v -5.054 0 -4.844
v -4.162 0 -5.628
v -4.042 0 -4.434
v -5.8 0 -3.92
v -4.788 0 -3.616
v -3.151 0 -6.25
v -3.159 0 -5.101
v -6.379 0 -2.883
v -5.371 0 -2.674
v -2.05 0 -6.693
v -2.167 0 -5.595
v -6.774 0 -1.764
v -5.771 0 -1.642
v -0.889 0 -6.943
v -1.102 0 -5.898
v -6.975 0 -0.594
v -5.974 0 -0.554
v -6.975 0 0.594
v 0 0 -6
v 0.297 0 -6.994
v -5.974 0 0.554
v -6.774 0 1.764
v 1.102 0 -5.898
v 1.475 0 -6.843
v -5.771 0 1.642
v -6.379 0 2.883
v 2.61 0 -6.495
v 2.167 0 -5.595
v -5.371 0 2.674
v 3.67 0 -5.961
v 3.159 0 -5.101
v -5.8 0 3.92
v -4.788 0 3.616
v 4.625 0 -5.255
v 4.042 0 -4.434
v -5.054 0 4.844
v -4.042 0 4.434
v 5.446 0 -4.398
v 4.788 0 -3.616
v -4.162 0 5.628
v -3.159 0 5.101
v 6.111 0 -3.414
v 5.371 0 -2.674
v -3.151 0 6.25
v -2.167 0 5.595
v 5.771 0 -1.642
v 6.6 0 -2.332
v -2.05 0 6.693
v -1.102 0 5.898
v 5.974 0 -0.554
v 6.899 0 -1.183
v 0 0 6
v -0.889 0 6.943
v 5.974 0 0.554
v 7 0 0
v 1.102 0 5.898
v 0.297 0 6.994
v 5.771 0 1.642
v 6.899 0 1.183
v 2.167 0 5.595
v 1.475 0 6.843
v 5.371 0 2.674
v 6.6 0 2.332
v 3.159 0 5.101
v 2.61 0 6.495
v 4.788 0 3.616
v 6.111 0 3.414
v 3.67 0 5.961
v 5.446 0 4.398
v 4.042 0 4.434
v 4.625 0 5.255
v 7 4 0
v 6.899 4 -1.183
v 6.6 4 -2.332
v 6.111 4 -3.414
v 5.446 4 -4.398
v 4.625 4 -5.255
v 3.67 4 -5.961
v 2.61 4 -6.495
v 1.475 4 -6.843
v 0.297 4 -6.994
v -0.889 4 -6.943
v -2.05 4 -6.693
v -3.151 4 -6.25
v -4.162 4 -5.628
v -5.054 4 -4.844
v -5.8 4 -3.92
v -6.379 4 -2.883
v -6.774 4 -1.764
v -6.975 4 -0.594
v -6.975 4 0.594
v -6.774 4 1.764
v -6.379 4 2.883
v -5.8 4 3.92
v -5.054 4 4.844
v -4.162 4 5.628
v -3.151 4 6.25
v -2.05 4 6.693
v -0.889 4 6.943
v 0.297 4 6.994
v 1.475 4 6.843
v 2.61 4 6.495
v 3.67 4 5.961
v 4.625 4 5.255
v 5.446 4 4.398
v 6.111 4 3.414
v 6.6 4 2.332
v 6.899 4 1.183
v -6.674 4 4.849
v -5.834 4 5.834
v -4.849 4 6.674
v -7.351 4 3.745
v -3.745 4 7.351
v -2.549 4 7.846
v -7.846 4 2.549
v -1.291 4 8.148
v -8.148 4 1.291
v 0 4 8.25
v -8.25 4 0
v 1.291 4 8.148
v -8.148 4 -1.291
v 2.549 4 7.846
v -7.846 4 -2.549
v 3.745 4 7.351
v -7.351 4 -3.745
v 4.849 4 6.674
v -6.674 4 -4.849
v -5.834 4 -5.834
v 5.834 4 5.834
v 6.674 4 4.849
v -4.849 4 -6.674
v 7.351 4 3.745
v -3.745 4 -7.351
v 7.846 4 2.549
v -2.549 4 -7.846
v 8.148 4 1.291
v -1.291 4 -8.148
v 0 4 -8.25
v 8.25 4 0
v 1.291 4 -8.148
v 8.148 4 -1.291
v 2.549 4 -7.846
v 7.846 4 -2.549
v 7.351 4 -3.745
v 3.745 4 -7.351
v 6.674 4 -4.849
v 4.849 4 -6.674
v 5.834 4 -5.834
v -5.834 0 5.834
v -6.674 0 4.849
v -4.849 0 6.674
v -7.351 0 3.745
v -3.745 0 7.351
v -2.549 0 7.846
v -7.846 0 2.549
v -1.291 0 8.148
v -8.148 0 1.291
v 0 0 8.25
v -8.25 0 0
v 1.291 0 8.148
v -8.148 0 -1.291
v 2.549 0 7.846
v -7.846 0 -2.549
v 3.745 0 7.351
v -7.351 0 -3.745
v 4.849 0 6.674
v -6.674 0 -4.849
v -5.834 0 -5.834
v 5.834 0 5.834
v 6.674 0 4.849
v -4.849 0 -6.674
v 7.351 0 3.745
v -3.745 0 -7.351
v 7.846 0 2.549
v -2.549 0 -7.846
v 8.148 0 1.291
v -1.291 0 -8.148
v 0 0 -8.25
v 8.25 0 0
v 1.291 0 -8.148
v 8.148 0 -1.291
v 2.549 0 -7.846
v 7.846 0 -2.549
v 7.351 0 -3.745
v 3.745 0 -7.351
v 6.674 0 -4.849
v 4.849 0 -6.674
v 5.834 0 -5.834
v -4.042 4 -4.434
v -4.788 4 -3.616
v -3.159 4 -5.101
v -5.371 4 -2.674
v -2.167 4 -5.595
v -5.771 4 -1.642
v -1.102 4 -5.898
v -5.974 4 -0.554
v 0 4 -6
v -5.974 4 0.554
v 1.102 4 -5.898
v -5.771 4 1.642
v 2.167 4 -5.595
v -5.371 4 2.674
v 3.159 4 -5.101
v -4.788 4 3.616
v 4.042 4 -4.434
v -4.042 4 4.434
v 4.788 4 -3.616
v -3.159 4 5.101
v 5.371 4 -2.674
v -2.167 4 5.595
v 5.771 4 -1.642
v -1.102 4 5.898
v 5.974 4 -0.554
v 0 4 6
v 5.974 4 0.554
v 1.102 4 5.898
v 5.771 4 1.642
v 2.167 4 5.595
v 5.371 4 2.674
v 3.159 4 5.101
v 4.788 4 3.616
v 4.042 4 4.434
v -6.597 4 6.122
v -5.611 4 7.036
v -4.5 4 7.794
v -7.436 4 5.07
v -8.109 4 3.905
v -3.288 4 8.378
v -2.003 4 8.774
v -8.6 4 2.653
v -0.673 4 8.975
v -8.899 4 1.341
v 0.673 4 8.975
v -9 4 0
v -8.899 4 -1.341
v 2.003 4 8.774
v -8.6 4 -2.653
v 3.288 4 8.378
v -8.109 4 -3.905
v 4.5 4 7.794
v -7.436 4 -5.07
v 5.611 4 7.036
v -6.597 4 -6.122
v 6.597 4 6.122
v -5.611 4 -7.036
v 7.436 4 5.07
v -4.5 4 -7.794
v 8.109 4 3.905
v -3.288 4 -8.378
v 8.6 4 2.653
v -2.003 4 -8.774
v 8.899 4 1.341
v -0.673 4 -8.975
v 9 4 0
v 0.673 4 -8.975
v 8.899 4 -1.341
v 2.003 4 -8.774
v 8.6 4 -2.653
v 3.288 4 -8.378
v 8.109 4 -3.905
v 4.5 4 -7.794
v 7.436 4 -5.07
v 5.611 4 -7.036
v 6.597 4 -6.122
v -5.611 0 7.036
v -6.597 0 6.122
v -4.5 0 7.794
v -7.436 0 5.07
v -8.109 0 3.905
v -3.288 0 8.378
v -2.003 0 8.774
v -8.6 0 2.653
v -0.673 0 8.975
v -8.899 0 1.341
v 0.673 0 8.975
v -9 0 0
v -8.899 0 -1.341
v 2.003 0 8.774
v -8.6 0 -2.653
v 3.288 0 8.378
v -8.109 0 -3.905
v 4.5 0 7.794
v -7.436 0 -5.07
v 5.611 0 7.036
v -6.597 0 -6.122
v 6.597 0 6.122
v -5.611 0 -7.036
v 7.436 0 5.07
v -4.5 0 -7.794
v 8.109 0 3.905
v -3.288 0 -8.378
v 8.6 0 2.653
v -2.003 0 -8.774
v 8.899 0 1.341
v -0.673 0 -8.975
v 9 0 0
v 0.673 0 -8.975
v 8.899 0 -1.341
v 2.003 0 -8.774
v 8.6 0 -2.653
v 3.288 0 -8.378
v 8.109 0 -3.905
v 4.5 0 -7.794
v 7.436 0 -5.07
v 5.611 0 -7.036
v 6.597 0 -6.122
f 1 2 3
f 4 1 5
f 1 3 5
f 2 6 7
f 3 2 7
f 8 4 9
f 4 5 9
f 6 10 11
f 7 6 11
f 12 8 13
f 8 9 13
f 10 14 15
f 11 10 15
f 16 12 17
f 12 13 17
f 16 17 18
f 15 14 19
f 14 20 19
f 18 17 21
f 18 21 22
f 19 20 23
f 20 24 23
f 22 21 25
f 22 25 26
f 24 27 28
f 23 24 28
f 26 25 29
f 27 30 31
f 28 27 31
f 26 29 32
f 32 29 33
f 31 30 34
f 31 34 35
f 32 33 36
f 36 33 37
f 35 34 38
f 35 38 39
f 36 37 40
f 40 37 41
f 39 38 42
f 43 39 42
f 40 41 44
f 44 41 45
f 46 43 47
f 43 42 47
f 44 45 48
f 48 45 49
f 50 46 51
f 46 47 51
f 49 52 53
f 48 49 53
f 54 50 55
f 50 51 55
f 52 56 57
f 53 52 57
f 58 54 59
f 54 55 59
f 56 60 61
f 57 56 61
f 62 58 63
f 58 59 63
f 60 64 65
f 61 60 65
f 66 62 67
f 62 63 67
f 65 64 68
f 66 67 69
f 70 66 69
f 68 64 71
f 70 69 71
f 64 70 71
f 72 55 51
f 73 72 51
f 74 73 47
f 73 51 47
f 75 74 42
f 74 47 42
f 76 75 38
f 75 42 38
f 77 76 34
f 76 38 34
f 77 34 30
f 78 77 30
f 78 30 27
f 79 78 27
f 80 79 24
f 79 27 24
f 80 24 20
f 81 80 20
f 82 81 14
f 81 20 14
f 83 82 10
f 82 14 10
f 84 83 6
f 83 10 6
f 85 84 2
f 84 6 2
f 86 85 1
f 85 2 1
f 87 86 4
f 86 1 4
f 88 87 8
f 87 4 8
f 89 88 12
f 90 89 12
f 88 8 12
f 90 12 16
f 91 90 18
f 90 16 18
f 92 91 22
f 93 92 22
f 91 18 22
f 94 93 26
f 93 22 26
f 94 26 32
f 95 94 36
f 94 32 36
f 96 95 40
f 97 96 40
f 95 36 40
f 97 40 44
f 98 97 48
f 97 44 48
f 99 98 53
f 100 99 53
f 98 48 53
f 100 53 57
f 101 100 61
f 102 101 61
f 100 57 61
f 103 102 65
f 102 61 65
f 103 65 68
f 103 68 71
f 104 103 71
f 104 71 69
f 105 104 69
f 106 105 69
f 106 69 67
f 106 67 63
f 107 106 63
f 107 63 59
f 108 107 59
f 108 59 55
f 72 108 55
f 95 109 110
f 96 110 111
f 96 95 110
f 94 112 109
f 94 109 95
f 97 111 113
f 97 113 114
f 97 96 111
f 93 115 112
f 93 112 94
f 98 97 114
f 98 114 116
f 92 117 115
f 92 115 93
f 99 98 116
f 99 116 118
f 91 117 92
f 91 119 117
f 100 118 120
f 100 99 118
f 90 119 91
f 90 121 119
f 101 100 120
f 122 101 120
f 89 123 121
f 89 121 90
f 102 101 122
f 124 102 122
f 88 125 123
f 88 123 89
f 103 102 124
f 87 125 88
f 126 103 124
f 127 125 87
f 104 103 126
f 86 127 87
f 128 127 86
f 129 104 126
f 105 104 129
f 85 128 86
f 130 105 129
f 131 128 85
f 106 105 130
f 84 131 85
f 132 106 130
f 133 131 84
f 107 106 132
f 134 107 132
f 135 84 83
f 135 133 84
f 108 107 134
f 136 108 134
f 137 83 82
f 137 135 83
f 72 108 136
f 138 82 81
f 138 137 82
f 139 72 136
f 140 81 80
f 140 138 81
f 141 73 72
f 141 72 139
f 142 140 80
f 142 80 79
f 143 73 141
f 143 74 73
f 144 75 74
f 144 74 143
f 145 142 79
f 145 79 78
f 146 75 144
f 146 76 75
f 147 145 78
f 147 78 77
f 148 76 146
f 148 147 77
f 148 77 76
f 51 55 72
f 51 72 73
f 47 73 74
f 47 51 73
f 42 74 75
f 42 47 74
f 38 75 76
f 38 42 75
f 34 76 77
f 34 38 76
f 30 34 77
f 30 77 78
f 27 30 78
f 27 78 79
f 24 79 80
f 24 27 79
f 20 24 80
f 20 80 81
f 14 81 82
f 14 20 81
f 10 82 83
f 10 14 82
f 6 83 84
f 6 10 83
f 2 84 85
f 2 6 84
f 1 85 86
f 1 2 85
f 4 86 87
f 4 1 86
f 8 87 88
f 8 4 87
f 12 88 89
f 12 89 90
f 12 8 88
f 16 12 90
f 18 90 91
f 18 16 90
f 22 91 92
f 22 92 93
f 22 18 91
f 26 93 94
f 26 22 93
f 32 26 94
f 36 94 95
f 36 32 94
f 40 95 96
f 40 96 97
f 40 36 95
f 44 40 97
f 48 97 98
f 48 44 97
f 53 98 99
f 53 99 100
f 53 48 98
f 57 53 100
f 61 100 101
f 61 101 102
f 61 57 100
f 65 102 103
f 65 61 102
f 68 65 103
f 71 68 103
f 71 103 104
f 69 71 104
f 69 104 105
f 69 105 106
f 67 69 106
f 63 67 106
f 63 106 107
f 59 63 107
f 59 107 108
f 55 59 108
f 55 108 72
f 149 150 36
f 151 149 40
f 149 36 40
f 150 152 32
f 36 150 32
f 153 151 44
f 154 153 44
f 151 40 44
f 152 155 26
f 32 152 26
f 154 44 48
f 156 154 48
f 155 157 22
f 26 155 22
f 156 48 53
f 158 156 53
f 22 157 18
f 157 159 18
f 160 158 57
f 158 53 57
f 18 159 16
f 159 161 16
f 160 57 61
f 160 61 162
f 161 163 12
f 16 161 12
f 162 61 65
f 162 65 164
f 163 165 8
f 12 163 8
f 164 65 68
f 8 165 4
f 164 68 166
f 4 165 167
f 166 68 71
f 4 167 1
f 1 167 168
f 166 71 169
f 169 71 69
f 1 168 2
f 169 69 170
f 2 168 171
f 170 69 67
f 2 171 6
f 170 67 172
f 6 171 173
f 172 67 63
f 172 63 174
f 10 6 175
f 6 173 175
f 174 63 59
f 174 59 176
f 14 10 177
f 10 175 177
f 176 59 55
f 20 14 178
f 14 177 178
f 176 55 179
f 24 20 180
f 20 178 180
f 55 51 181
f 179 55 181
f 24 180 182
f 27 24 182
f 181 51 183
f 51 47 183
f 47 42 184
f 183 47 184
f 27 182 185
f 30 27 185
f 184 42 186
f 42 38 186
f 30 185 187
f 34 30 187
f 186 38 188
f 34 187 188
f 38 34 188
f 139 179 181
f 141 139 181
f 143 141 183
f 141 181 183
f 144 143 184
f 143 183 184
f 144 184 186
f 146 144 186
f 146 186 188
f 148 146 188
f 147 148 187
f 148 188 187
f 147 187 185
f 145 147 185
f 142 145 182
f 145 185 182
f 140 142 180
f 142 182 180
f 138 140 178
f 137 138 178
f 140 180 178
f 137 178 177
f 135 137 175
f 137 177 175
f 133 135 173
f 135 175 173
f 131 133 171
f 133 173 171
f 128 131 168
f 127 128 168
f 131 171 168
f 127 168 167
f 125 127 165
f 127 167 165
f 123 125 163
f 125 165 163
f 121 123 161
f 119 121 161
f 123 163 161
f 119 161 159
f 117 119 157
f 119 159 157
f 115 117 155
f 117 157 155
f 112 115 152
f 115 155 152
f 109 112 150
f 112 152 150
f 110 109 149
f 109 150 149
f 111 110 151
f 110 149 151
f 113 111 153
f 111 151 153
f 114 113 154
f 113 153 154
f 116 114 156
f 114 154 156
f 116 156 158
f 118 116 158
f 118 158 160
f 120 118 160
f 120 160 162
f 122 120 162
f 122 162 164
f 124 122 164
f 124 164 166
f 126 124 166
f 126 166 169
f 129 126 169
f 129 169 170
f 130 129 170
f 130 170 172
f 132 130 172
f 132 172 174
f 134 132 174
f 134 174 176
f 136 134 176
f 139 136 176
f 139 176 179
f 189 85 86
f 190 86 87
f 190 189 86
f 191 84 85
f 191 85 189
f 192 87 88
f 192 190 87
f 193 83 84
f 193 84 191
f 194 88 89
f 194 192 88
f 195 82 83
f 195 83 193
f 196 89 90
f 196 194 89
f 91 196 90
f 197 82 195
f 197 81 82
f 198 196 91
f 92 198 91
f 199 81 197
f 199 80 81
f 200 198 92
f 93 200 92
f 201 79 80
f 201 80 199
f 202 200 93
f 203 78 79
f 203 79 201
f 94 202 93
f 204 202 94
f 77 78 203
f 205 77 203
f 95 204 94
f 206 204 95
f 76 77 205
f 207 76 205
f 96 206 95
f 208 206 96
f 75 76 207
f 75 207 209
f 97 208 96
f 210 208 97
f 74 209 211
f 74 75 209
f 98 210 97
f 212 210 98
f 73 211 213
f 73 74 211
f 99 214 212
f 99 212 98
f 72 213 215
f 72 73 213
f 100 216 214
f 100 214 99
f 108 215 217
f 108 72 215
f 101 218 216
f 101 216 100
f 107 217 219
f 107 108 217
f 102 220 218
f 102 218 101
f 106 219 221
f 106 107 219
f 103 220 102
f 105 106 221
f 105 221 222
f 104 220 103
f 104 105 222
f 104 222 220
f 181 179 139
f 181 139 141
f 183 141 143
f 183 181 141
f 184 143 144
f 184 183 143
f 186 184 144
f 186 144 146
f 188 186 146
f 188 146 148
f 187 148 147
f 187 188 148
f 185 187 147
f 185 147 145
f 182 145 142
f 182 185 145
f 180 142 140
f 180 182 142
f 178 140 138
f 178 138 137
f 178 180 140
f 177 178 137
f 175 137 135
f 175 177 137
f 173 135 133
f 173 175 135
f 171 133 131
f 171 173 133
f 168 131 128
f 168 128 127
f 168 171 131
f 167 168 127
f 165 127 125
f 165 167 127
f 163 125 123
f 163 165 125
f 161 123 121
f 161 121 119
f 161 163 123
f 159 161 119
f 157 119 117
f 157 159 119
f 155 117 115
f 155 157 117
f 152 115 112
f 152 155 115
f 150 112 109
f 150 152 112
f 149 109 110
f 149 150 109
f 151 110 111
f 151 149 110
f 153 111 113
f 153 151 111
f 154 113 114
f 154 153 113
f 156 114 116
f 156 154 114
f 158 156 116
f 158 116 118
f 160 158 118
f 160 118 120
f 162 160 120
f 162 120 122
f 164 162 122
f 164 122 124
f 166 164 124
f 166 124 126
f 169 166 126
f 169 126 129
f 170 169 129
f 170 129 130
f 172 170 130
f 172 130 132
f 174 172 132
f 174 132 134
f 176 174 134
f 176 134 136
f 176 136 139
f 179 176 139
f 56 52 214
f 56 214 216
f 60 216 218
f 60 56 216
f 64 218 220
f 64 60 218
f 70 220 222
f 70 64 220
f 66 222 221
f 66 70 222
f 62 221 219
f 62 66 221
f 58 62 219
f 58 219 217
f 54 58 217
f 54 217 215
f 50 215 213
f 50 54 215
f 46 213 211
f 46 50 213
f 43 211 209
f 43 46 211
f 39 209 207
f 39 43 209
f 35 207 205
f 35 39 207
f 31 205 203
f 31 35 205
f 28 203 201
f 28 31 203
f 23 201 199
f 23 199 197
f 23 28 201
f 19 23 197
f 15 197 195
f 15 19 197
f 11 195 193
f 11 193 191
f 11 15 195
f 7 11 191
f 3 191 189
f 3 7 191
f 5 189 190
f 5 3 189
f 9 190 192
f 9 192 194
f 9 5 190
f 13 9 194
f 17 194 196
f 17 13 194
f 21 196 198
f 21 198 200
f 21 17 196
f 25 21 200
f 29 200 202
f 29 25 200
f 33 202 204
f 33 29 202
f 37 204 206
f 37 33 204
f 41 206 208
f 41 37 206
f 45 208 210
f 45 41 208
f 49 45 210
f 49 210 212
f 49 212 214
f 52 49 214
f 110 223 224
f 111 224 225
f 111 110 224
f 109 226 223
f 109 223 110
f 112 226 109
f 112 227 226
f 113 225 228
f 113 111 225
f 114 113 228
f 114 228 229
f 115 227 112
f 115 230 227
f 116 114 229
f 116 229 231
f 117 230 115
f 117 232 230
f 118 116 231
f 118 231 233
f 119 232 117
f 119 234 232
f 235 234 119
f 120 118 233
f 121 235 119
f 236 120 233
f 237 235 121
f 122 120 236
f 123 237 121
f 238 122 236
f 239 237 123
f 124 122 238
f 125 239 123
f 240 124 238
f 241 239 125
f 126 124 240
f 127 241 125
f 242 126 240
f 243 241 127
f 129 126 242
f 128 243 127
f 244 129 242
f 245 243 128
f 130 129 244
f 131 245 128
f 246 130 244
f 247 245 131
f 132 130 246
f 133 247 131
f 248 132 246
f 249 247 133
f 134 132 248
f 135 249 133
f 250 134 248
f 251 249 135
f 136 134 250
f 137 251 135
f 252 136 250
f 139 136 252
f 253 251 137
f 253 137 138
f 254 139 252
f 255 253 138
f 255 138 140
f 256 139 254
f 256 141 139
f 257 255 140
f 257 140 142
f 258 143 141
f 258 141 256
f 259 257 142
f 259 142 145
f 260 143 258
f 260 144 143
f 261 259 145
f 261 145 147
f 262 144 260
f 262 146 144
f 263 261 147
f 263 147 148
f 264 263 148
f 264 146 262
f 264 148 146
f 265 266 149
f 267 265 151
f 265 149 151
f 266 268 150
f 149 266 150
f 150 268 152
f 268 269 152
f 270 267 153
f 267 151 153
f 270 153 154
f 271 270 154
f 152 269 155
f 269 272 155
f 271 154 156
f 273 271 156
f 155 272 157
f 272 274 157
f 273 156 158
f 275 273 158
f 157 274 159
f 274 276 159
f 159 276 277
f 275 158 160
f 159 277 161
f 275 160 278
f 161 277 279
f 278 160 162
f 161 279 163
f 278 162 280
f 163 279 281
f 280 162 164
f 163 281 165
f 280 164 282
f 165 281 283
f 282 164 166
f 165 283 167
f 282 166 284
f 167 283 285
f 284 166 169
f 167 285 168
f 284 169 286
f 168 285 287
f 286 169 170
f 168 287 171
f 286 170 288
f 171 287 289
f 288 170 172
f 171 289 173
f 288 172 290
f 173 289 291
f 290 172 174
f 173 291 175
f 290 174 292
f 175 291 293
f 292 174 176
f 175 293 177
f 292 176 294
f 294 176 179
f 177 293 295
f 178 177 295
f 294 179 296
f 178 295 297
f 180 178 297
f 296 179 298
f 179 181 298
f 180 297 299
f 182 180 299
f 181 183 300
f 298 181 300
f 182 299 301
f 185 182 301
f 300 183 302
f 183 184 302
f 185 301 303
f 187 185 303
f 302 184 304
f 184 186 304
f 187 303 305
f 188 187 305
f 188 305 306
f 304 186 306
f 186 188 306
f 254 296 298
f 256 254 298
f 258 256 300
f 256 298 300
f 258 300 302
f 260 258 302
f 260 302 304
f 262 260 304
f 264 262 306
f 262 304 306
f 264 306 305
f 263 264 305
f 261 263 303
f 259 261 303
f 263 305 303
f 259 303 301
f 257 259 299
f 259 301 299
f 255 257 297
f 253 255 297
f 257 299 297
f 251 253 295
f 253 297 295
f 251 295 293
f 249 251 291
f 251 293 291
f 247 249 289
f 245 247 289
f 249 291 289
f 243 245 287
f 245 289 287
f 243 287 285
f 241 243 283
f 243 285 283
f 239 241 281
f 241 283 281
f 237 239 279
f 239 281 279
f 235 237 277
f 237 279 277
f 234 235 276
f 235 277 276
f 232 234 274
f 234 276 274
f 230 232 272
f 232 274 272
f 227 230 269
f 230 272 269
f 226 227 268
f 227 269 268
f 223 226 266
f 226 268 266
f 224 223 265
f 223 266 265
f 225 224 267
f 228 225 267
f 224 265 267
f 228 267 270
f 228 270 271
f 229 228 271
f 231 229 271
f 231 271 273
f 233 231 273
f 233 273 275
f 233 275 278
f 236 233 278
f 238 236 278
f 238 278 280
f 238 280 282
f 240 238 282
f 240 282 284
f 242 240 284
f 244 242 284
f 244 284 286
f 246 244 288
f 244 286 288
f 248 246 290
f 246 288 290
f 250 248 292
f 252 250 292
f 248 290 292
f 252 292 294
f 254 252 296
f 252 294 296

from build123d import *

# Parameters (mm, degrees)
SKETCH_1_R                   = 9
SKETCH_1_R_2                 = 6
EXTRUDE_1_DEPTH              = 4
SPLIT_BODIES_1_OUTLINE_R     = 8.25
SPLIT_BODIES_1_OUTLINE_R_2   = 7
SPLIT_BODIES_1_DEPTH         = 4
SPLIT_BODIES_1_2_OUTLINE_R   = 9
SPLIT_BODIES_1_2_OUTLINE_R_2 = 7
SPLIT_BODIES_1_2_DEPTH       = 4
SPLIT_BODIES_1_3_OUTLINE_R   = 9
SPLIT_BODIES_1_3_OUTLINE_R_2 = 8.25
SPLIT_BODIES_1_3_DEPTH       = 4


# Read off the part's stored shape, not the designer's step: 分割1
with BuildPart() as part:
    # 草图1 → 凸台-拉伸1 (new body)
    with BuildSketch(Plane(origin=(0, 0, 0), x_dir=(1, 0, 0), z_dir=(0, 1, 0))):
        with Locations(Location((0, 0, 0), (0, 0, 270))):
            Circle(SKETCH_1_R)
        with Locations(Location((0, 0, 0), (0, 0, 270))):
            Circle(SKETCH_1_R_2, mode=Mode.SUBTRACT)
    extrude(amount=EXTRUDE_1_DEPTH)

    # Split Bodies 1 2 outline → Split Bodies 1 2 (cut)
    with BuildSketch(Plane(origin=(0, 0, 0), x_dir=(1, 0, 0), z_dir=(0, 1, 0))):
        Circle(SPLIT_BODIES_1_2_OUTLINE_R)
        Circle(SPLIT_BODIES_1_2_OUTLINE_R_2, mode=Mode.SUBTRACT)
    extrude(amount=SPLIT_BODIES_1_2_DEPTH, mode=Mode.SUBTRACT)


with BuildPart() as body_2:
    # Split Bodies 1 outline → Split Bodies 1 (new body)
    with BuildSketch(Plane(origin=(0, 0, 0), x_dir=(1, 0, 0), z_dir=(0, 1, 0))):
        Circle(SPLIT_BODIES_1_OUTLINE_R)
        Circle(SPLIT_BODIES_1_OUTLINE_R_2, mode=Mode.SUBTRACT)
    extrude(amount=SPLIT_BODIES_1_DEPTH)


with BuildPart() as body_3:
    # Split Bodies 1 3 outline → Split Bodies 1 3 (new body)
    with BuildSketch(Plane(origin=(0, 0, 0), x_dir=(1, 0, 0), z_dir=(0, 1, 0))):
        Circle(SPLIT_BODIES_1_3_OUTLINE_R)
        Circle(SPLIT_BODIES_1_3_OUTLINE_R_2, mode=Mode.SUBTRACT)
    extrude(amount=SPLIT_BODIES_1_3_DEPTH)


solid = Compound([part.part, body_2.part, body_3.part])
